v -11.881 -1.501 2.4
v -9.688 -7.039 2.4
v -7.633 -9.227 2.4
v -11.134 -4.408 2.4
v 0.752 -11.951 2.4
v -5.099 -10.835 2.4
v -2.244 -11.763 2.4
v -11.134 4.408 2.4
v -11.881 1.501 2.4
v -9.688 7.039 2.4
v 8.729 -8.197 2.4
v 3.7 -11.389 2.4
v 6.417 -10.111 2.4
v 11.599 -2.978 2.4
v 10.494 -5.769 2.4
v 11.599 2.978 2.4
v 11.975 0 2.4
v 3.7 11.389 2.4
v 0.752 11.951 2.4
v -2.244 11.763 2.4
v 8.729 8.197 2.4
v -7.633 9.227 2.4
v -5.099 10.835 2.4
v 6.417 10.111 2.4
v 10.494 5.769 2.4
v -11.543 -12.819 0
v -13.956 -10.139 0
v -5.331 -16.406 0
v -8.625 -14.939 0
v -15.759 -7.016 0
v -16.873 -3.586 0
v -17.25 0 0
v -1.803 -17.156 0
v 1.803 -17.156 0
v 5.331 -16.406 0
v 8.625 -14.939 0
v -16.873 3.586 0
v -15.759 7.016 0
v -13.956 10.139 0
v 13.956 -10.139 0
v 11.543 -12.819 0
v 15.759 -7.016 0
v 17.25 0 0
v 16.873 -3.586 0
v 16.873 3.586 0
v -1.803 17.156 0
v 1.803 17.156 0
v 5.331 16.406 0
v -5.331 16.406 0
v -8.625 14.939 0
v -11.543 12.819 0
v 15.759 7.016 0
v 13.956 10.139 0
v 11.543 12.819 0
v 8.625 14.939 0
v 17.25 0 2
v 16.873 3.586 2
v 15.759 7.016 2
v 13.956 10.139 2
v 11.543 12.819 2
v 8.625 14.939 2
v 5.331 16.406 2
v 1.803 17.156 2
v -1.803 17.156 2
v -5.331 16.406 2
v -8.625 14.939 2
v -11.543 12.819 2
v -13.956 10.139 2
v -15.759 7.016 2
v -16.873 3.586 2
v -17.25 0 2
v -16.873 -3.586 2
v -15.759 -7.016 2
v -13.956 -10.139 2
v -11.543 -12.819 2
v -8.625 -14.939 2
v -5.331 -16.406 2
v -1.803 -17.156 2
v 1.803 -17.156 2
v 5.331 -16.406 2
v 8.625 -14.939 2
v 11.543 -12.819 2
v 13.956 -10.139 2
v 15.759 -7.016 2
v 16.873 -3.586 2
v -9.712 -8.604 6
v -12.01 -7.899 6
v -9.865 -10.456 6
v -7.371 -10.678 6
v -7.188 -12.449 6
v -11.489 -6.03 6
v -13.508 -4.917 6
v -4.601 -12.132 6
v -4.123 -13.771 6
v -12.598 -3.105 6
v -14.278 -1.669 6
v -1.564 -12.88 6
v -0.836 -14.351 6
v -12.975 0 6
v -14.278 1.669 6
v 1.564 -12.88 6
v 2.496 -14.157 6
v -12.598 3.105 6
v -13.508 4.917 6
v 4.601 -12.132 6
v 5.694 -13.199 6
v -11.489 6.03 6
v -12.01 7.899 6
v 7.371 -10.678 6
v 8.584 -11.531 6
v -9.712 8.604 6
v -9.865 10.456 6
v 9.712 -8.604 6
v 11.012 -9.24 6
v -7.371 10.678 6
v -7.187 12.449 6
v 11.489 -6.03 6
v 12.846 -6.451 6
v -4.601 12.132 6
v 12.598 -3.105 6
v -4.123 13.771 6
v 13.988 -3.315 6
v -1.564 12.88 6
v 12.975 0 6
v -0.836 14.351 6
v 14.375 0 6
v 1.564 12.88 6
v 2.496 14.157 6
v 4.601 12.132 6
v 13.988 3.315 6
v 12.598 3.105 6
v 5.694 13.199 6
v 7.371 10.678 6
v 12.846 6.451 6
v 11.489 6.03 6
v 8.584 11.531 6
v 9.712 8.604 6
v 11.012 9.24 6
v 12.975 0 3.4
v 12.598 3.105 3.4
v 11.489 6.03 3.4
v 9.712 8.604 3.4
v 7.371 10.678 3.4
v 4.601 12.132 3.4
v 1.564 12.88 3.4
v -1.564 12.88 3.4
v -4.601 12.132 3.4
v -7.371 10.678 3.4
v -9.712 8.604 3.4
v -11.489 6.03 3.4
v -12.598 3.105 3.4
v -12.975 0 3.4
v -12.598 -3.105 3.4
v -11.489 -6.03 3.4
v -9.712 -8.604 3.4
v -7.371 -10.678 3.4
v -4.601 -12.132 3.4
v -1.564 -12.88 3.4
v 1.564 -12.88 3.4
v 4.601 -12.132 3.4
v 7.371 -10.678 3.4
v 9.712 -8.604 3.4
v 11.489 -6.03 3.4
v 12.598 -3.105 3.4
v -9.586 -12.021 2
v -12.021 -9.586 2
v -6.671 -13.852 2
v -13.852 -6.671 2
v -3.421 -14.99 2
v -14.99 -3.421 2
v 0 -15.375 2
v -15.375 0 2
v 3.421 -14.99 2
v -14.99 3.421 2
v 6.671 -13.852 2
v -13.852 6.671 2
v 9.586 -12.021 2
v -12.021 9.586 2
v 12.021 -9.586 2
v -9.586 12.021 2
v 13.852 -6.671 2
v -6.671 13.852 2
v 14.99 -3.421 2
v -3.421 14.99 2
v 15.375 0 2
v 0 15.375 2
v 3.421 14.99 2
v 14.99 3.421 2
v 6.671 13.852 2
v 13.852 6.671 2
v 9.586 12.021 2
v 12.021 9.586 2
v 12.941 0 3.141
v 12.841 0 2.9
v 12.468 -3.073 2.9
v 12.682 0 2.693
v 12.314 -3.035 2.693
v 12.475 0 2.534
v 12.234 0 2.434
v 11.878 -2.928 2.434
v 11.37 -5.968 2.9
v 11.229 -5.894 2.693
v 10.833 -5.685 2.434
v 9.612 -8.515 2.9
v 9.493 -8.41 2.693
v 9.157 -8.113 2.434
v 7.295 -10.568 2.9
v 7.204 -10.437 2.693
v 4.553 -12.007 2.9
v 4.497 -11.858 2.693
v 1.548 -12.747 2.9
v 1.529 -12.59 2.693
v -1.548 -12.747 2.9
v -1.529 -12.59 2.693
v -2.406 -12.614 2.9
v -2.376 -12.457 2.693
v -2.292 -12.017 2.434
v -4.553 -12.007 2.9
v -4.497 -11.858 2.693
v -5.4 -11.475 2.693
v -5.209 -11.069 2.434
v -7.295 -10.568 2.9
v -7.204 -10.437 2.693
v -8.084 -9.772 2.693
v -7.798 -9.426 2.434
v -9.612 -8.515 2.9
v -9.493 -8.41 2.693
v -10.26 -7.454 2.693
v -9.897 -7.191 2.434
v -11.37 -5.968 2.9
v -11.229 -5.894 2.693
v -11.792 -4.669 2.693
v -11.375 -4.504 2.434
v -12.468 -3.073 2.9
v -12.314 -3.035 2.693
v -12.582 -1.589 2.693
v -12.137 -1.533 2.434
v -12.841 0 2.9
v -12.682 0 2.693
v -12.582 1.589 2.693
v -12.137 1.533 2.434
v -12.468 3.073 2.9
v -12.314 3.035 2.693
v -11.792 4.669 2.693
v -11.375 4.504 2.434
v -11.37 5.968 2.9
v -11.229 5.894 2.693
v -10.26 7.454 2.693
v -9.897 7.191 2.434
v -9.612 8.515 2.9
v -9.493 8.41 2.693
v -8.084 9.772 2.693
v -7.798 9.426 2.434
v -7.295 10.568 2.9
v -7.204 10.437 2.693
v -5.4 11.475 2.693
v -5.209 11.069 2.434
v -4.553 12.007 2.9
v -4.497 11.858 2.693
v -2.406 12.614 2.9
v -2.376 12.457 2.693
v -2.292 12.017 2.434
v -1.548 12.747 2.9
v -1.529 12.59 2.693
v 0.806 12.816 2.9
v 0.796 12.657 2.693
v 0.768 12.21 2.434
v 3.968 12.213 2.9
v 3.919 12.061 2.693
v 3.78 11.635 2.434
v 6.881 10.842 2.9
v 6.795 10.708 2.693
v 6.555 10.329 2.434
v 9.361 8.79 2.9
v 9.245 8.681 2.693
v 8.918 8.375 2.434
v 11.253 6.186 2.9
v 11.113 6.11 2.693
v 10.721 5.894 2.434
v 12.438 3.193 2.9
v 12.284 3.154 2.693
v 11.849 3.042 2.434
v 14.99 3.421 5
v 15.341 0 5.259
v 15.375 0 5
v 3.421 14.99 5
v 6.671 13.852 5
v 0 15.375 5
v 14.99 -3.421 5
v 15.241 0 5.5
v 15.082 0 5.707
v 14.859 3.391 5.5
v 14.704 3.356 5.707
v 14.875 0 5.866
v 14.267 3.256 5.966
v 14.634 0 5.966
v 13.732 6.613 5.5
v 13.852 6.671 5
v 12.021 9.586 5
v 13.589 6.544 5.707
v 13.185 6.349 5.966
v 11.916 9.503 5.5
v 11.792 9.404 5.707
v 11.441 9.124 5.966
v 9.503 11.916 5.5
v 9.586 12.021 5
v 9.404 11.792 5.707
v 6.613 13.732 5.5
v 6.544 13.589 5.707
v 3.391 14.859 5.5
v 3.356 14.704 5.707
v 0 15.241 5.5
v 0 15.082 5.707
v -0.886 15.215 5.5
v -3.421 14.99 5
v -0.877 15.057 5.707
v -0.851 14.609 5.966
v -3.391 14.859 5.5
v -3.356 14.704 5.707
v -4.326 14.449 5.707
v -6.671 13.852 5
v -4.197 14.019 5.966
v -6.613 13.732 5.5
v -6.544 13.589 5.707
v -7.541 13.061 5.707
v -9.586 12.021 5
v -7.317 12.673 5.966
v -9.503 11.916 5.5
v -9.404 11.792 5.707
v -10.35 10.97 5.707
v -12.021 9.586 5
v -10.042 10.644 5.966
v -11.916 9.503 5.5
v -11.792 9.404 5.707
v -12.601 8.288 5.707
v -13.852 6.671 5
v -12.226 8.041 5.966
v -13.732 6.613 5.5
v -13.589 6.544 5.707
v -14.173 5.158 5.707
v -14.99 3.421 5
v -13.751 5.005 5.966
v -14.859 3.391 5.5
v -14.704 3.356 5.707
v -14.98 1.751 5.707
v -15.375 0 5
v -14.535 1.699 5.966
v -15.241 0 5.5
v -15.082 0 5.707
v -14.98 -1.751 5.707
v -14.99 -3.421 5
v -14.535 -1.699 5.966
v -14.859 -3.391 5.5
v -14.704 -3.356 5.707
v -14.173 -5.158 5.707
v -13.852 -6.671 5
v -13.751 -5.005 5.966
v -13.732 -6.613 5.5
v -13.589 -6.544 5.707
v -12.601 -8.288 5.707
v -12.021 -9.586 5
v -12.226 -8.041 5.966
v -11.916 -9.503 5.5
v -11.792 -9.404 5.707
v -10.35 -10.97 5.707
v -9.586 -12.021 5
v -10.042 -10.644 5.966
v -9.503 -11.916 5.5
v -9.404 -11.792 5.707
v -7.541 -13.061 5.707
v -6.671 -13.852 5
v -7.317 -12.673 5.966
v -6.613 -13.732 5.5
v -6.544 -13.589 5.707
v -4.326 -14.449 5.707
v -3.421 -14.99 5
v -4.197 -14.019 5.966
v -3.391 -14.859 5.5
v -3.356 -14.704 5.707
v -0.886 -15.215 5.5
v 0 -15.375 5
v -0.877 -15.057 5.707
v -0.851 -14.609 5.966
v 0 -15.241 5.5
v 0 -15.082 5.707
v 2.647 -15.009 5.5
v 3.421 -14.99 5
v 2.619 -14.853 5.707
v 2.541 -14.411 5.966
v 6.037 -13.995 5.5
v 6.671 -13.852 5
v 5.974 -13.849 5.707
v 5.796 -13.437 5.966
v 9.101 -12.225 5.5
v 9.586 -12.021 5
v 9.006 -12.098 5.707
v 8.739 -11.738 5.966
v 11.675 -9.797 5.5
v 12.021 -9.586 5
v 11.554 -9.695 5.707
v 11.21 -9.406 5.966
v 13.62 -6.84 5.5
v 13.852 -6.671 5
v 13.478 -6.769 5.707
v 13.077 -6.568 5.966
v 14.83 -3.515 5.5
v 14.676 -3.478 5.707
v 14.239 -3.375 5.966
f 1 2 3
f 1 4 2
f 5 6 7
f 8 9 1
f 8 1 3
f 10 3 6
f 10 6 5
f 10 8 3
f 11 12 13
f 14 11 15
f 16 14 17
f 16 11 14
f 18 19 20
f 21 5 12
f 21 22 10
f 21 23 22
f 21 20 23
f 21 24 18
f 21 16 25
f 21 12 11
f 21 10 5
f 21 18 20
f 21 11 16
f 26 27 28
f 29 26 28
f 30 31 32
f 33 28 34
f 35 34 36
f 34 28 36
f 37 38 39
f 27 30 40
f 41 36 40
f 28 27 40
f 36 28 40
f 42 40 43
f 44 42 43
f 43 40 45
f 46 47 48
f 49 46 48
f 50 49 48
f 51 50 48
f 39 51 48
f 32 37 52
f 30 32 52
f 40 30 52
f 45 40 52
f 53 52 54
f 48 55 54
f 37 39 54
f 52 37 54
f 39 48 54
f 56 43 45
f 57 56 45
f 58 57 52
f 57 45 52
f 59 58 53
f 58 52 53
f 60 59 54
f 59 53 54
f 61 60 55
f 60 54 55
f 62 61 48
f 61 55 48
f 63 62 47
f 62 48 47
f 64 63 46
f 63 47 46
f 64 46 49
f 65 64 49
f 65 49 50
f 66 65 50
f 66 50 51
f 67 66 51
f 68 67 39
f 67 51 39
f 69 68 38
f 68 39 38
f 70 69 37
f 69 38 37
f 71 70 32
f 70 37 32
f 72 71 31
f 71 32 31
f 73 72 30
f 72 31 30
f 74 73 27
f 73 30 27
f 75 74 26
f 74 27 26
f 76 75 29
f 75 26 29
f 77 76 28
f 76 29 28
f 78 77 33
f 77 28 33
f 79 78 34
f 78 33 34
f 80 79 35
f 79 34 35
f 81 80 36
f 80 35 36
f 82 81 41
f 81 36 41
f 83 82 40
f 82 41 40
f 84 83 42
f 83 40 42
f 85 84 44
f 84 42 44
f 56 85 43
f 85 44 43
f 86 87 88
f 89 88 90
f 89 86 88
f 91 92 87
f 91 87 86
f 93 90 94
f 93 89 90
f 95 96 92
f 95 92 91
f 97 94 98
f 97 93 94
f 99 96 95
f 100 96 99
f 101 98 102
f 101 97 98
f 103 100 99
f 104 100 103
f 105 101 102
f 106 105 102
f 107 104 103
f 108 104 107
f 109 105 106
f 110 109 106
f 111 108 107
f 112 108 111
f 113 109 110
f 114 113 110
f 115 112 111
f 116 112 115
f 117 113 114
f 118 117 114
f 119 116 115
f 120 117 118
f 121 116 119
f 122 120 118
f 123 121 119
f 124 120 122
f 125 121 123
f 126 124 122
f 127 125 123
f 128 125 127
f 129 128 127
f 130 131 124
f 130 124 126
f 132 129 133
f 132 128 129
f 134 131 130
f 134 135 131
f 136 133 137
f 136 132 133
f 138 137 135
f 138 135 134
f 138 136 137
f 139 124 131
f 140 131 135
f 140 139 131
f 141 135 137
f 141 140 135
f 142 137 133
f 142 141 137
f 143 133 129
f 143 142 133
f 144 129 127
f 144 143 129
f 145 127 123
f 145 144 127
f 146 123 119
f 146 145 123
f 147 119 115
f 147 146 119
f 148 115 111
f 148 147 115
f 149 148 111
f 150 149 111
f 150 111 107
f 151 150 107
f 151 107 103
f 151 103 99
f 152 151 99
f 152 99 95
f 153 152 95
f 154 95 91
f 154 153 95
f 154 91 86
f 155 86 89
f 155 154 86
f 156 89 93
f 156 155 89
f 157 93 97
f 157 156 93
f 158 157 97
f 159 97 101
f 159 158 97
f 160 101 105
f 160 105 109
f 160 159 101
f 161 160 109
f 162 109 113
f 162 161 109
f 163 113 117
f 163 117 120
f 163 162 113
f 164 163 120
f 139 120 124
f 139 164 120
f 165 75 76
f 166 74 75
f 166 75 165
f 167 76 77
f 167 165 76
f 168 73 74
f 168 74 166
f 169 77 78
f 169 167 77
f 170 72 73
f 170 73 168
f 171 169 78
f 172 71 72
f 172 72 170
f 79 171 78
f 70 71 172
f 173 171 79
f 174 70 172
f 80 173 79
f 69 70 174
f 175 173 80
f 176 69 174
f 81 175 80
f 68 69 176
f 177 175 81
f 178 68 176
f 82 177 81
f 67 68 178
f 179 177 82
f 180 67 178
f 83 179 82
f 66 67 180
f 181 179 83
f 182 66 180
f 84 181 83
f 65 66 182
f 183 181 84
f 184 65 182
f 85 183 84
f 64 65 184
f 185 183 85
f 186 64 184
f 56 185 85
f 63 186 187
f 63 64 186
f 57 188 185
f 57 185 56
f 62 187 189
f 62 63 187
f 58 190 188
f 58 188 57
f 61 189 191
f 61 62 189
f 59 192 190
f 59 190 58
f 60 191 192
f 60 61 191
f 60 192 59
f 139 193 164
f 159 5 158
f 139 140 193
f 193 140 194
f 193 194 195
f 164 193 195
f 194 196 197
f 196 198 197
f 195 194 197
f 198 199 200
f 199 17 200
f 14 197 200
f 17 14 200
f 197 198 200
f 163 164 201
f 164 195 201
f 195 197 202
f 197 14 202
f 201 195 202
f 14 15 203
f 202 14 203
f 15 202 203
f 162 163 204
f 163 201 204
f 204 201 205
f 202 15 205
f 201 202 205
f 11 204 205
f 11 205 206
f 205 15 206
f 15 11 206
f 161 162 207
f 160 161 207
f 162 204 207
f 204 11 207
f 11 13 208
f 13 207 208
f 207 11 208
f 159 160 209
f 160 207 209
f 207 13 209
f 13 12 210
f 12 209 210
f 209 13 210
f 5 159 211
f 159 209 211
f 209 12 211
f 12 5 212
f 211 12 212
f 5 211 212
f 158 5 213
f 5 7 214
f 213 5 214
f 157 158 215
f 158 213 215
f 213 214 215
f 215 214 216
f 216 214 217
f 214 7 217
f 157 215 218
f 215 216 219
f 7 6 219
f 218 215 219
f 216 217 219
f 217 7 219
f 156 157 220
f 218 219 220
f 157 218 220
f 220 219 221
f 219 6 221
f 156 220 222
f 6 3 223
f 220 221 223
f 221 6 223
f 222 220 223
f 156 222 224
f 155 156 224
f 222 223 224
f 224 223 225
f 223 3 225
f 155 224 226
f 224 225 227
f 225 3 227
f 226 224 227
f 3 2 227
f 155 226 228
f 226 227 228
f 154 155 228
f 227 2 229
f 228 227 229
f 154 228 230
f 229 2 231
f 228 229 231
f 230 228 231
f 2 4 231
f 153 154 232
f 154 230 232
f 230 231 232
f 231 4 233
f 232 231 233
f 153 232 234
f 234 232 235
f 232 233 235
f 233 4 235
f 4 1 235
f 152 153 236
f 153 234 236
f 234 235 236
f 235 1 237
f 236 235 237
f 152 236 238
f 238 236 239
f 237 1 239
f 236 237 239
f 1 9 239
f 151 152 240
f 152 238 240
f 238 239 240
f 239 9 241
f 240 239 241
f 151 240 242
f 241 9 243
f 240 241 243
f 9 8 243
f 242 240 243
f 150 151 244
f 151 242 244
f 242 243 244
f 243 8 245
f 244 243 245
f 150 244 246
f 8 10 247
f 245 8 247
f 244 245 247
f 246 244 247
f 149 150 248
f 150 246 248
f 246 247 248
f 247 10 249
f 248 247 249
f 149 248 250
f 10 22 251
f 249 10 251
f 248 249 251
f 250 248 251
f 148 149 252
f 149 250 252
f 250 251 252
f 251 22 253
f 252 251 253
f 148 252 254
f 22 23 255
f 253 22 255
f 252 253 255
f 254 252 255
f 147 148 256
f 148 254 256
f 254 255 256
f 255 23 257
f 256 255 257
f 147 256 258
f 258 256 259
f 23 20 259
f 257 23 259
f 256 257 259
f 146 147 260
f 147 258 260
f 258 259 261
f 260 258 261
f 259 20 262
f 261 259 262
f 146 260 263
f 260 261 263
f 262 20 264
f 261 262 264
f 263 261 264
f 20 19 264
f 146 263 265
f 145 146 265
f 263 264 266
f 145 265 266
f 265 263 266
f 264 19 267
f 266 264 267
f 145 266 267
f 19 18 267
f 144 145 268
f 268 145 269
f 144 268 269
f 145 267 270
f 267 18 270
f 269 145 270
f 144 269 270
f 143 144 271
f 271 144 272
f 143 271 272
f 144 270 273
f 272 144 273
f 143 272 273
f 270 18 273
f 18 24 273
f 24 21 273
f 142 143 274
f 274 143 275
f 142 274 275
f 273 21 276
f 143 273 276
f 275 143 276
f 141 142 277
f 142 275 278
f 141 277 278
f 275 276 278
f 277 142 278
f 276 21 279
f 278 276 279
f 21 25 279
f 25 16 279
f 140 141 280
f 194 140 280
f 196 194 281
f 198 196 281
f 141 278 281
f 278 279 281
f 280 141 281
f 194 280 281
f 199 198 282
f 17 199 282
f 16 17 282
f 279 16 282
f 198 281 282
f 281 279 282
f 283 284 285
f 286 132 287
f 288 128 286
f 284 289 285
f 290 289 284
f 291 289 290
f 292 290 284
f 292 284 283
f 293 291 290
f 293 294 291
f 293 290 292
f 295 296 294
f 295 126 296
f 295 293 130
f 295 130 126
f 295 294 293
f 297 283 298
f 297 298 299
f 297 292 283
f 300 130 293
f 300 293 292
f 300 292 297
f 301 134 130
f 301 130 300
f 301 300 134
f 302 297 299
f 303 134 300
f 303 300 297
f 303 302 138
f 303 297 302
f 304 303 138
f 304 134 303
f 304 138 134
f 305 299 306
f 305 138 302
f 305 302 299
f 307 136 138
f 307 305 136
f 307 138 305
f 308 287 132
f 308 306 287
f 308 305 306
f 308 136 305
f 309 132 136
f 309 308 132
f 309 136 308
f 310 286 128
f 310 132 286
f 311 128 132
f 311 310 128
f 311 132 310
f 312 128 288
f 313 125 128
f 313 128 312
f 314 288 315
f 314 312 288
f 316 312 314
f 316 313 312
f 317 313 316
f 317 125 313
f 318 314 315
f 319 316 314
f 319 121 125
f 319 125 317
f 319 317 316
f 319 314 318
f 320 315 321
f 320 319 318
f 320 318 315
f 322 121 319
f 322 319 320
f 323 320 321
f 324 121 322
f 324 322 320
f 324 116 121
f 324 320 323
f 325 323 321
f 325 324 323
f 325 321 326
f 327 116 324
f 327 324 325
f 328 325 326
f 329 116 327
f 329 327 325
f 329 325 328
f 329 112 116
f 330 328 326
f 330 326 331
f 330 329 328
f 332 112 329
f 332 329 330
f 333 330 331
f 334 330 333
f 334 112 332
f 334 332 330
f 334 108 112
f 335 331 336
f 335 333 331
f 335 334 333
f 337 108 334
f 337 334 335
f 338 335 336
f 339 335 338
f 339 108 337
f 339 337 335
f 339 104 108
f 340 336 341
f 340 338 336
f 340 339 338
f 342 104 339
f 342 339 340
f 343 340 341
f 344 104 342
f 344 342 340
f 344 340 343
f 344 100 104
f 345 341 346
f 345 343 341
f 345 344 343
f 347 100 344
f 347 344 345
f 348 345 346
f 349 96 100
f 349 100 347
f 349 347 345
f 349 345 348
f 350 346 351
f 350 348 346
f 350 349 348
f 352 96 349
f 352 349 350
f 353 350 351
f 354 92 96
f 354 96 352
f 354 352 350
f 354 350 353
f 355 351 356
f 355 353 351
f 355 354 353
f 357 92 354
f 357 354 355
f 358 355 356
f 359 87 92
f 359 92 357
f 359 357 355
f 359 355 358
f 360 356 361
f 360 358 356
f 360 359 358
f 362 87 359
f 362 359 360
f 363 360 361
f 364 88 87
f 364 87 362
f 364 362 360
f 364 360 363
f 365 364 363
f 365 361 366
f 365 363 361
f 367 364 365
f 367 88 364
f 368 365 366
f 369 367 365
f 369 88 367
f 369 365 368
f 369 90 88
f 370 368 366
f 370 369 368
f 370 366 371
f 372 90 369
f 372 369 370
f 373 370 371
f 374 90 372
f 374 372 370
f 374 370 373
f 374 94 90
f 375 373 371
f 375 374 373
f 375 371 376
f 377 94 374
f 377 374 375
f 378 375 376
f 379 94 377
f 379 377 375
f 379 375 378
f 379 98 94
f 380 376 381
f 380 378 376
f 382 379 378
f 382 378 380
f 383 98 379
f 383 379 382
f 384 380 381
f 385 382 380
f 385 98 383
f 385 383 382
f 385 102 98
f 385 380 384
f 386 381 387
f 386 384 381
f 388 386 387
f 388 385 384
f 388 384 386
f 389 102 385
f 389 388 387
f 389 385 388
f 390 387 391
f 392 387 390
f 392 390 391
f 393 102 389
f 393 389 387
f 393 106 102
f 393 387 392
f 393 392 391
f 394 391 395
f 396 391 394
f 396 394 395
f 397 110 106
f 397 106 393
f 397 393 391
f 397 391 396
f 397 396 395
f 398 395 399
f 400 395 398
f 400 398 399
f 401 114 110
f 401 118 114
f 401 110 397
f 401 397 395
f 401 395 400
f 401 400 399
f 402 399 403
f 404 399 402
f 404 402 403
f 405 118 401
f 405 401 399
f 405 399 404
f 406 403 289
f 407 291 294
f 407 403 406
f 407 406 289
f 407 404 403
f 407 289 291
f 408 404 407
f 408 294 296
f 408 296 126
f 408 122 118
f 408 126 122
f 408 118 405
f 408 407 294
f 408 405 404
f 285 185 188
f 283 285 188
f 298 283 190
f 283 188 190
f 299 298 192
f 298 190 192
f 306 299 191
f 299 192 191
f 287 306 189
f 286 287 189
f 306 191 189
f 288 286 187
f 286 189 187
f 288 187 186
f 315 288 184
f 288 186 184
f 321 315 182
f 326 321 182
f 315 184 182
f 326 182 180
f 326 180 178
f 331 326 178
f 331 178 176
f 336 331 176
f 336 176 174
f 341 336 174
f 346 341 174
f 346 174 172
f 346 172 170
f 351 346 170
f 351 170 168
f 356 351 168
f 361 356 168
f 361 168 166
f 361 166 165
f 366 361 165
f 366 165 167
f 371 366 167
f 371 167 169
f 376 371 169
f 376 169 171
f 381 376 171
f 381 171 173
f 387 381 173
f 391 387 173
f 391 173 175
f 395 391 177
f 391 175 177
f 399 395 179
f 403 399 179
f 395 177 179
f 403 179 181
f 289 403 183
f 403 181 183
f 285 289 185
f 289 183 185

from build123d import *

# Parameters (mm, degrees)
F0_R     = 15.375
F1_DEPTH = 6
F0_R_2   = 17.25
F2_DEPTH = 2
F3_T     = -2.4
F4_R     = 1


with BuildPart() as f1:
    # F0 (on Top) → F1 (new body)
    with BuildSketch(Plane.XY):
        Circle(F0_R)
    extrude(amount=F1_DEPTH)

    # F0 (on Top) → F2 (join)
    with BuildSketch(Plane.XY):
        Circle(F0_R_2)
        Circle(F0_R, mode=Mode.SUBTRACT)
    extrude(amount=F2_DEPTH)

    # F3
    f3_openings = [f1.faces().sort_by_distance(p)[0] for p in [
        (0, 0, 6),
    ]]
    offset(amount=F3_T, openings=f3_openings)

    # F4
    f4_edges = [f1.edges().sort_by_distance(p)[0] for p in [
        (-15.375, 0, 6),
        (-12.975, 0, 2.4),
    ]]
    fillet(f4_edges, radius=F4_R)


solid = f1.part
